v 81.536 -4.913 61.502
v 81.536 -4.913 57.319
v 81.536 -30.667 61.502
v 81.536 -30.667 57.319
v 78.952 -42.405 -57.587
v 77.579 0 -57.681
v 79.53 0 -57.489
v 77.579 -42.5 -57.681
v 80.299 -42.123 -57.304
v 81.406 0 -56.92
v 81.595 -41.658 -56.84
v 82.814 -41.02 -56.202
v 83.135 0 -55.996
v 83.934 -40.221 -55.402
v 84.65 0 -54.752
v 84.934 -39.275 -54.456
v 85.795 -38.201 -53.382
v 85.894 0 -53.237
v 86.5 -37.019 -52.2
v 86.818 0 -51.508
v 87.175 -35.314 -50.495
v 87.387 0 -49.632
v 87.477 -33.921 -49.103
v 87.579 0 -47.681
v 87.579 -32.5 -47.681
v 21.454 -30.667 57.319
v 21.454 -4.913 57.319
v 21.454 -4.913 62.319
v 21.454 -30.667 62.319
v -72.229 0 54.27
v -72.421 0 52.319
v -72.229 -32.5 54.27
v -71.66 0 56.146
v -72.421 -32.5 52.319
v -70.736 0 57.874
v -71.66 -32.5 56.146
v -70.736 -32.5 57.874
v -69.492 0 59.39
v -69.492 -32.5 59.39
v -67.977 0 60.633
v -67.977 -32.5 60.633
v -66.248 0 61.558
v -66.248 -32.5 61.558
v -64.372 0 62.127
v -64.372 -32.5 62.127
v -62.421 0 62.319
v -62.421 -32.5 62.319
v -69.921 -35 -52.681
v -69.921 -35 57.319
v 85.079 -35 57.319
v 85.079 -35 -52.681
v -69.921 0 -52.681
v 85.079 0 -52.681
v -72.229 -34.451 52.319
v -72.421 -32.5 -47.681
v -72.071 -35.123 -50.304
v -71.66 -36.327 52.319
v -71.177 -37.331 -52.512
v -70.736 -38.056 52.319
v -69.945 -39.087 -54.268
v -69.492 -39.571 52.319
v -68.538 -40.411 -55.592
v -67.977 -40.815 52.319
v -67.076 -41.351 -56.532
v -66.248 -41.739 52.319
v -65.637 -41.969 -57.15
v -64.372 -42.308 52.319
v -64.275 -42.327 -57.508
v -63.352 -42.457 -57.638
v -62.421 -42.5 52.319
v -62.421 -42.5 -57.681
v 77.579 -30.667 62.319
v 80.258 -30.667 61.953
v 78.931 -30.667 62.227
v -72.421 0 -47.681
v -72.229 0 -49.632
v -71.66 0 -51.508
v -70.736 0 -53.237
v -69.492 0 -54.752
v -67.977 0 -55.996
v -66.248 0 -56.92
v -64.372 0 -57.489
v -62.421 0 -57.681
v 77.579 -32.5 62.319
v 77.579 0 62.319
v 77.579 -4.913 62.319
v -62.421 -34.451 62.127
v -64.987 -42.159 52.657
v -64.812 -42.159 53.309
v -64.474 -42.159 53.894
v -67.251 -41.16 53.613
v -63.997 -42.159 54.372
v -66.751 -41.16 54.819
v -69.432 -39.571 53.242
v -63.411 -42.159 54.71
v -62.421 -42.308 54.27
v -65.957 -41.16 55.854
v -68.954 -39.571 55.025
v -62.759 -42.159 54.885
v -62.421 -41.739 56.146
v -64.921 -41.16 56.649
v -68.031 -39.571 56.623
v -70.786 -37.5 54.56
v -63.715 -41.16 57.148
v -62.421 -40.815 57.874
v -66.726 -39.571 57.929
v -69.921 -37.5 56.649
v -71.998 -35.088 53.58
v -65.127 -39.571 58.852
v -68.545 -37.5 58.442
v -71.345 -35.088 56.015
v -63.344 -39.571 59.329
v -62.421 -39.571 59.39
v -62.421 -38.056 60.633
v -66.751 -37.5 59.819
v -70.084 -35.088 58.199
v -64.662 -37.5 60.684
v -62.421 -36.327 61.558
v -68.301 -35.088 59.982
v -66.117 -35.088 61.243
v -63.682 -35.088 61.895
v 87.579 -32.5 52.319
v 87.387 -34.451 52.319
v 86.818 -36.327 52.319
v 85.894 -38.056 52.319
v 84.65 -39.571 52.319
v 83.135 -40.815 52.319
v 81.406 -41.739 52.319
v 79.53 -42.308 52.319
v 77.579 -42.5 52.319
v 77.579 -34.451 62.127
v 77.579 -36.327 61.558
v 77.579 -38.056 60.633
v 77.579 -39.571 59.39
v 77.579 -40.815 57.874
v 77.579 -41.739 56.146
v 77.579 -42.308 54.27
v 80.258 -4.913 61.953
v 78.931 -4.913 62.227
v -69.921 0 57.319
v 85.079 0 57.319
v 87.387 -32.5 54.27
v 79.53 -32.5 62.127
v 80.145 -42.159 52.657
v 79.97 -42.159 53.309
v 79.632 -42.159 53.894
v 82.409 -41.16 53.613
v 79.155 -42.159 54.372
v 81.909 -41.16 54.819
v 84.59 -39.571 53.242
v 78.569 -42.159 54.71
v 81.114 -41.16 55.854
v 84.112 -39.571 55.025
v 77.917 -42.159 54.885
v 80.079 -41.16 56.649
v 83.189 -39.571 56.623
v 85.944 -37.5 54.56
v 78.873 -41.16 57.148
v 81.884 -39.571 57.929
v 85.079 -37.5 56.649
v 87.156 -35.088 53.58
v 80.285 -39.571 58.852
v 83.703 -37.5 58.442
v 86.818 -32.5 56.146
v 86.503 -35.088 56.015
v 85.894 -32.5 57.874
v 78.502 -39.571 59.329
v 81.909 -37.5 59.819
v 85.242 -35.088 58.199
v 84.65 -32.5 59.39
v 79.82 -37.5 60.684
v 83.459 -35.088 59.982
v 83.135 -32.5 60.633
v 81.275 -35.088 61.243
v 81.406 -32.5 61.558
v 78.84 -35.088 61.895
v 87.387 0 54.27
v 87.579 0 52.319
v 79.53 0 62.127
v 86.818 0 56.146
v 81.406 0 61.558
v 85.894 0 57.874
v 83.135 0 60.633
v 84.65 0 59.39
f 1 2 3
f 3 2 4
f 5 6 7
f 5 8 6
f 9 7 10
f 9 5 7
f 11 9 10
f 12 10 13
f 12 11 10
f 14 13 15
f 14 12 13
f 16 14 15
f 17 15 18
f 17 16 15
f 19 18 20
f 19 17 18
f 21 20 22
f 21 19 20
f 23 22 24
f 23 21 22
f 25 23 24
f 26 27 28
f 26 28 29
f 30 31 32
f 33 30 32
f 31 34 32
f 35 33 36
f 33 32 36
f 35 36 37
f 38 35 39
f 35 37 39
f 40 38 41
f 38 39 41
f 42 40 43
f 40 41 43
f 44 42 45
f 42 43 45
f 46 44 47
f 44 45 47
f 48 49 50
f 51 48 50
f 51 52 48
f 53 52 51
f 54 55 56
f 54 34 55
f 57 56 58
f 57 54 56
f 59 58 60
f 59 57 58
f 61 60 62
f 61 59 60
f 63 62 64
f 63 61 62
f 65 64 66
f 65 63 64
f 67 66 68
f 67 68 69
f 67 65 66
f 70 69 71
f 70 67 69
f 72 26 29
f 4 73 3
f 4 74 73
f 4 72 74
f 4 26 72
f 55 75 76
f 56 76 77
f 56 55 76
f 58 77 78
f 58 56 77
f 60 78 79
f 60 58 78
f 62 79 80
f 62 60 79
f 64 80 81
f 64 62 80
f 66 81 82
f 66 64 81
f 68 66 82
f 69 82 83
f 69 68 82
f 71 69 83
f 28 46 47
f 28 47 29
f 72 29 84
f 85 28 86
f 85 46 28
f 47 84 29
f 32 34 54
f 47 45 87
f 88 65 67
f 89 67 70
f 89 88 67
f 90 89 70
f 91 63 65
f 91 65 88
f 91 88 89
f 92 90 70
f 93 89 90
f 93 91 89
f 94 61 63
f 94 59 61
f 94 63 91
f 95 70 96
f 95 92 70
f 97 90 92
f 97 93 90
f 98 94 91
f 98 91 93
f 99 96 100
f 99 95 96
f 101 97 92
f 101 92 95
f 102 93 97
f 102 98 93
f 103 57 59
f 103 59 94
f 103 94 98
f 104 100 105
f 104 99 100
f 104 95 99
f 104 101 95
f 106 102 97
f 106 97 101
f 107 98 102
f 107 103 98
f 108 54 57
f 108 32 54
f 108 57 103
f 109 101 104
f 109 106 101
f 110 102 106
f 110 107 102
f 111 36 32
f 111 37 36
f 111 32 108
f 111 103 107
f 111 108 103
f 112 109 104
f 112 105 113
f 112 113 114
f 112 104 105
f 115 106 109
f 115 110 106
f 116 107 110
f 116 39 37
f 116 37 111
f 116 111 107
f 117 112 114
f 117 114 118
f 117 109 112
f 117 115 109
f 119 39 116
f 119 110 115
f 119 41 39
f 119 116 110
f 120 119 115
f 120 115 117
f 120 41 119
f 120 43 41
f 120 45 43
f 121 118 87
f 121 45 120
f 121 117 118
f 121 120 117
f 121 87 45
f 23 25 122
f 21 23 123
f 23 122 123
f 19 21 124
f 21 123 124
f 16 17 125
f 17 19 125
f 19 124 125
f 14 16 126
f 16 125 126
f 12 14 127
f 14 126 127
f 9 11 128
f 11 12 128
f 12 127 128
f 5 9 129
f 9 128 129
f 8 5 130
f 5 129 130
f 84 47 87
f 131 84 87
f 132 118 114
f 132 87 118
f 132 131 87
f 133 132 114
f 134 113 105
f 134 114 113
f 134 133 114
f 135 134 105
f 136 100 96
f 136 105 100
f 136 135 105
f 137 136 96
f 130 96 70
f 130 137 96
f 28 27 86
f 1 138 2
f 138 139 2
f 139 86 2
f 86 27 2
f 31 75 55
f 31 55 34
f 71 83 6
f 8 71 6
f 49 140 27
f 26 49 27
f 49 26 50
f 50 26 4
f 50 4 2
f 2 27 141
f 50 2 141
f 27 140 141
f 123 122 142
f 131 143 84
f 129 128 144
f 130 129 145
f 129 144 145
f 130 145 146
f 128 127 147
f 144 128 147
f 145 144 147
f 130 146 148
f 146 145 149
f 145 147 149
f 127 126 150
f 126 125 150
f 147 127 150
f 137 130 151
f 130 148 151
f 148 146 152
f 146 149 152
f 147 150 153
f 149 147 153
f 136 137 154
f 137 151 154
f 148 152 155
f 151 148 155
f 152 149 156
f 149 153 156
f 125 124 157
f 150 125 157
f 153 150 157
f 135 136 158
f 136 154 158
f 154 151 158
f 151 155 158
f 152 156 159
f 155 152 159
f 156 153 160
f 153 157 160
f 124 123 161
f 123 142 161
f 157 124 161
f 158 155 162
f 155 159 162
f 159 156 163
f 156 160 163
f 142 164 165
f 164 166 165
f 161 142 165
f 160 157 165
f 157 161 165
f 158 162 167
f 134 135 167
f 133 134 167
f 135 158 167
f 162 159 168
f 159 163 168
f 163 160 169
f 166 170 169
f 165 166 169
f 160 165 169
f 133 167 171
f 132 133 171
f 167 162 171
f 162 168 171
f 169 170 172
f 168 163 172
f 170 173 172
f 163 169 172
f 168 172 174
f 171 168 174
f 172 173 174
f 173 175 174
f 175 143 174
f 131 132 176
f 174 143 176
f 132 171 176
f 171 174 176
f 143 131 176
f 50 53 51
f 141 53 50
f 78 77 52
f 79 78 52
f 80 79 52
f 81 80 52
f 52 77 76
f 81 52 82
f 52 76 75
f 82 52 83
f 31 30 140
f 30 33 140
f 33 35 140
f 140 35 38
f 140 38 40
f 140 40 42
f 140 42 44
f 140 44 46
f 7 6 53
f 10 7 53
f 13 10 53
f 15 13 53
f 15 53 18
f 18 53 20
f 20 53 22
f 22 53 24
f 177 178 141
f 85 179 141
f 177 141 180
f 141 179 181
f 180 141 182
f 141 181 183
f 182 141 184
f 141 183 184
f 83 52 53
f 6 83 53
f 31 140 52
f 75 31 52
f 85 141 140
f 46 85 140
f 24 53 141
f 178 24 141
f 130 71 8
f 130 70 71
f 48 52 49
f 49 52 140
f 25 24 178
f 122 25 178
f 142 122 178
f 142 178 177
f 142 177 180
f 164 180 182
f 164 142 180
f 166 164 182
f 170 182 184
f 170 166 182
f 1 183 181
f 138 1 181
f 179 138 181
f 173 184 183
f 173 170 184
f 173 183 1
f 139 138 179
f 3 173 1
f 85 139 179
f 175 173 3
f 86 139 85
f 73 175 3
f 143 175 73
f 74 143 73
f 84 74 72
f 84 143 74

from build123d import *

# Parameters (mm, degrees)
F0_W     = 160
F0_H     = 120
F1_DEPTH = 42.5
F2_R     = 10
F3_W     = 155
F3_H     = 110
F4_DEPTH = 35
F5_W     = 60.082482
F5_H     = 25.754019
F6_DEPTH = 5.001


with BuildPart() as f1:
    # F0 (on Front) → F1 (new body)
    with BuildSketch(Plane.XZ):
        with Locations((7.578965, 2.318726)):
            Rectangle(F0_W, F0_H)
    extrude(amount=F1_DEPTH)

    # F2
    f2_edges = [f1.edges().sort_by_distance(p)[0] for p in [
        (87.578965, -21.25, 62.318726),
        (-72.421035, -21.25, 62.318726),
        (87.578965, -21.25, -57.681274),
        (-72.421035, -21.25, -57.681274),
        (-72.421035, -42.5, 2.318726),
        (87.578965, -42.5, 2.318726),
        (7.578965, -42.5, 62.318726),
    ]]
    fillet(f2_edges, radius=F2_R)

    # F3 (on Front) → F4 (cut)
    with BuildSketch(Plane.XZ):
        with Locations((7.578965, 2.318726)):
            Rectangle(F3_W, F3_H)
    extrude(amount=F4_DEPTH, mode=Mode.SUBTRACT)

    # F5 (on face) → F6 (cut, through all)
    with BuildSketch(Plane(origin=(0, 0, 57.318726), x_dir=(1, 0, 0), z_dir=(0, 0, -1))):
        with Locations((51.495171, 17.789639)):
            Rectangle(F5_W, F5_H)
    extrude(amount=-F6_DEPTH, mode=Mode.SUBTRACT)


solid = f1.part
